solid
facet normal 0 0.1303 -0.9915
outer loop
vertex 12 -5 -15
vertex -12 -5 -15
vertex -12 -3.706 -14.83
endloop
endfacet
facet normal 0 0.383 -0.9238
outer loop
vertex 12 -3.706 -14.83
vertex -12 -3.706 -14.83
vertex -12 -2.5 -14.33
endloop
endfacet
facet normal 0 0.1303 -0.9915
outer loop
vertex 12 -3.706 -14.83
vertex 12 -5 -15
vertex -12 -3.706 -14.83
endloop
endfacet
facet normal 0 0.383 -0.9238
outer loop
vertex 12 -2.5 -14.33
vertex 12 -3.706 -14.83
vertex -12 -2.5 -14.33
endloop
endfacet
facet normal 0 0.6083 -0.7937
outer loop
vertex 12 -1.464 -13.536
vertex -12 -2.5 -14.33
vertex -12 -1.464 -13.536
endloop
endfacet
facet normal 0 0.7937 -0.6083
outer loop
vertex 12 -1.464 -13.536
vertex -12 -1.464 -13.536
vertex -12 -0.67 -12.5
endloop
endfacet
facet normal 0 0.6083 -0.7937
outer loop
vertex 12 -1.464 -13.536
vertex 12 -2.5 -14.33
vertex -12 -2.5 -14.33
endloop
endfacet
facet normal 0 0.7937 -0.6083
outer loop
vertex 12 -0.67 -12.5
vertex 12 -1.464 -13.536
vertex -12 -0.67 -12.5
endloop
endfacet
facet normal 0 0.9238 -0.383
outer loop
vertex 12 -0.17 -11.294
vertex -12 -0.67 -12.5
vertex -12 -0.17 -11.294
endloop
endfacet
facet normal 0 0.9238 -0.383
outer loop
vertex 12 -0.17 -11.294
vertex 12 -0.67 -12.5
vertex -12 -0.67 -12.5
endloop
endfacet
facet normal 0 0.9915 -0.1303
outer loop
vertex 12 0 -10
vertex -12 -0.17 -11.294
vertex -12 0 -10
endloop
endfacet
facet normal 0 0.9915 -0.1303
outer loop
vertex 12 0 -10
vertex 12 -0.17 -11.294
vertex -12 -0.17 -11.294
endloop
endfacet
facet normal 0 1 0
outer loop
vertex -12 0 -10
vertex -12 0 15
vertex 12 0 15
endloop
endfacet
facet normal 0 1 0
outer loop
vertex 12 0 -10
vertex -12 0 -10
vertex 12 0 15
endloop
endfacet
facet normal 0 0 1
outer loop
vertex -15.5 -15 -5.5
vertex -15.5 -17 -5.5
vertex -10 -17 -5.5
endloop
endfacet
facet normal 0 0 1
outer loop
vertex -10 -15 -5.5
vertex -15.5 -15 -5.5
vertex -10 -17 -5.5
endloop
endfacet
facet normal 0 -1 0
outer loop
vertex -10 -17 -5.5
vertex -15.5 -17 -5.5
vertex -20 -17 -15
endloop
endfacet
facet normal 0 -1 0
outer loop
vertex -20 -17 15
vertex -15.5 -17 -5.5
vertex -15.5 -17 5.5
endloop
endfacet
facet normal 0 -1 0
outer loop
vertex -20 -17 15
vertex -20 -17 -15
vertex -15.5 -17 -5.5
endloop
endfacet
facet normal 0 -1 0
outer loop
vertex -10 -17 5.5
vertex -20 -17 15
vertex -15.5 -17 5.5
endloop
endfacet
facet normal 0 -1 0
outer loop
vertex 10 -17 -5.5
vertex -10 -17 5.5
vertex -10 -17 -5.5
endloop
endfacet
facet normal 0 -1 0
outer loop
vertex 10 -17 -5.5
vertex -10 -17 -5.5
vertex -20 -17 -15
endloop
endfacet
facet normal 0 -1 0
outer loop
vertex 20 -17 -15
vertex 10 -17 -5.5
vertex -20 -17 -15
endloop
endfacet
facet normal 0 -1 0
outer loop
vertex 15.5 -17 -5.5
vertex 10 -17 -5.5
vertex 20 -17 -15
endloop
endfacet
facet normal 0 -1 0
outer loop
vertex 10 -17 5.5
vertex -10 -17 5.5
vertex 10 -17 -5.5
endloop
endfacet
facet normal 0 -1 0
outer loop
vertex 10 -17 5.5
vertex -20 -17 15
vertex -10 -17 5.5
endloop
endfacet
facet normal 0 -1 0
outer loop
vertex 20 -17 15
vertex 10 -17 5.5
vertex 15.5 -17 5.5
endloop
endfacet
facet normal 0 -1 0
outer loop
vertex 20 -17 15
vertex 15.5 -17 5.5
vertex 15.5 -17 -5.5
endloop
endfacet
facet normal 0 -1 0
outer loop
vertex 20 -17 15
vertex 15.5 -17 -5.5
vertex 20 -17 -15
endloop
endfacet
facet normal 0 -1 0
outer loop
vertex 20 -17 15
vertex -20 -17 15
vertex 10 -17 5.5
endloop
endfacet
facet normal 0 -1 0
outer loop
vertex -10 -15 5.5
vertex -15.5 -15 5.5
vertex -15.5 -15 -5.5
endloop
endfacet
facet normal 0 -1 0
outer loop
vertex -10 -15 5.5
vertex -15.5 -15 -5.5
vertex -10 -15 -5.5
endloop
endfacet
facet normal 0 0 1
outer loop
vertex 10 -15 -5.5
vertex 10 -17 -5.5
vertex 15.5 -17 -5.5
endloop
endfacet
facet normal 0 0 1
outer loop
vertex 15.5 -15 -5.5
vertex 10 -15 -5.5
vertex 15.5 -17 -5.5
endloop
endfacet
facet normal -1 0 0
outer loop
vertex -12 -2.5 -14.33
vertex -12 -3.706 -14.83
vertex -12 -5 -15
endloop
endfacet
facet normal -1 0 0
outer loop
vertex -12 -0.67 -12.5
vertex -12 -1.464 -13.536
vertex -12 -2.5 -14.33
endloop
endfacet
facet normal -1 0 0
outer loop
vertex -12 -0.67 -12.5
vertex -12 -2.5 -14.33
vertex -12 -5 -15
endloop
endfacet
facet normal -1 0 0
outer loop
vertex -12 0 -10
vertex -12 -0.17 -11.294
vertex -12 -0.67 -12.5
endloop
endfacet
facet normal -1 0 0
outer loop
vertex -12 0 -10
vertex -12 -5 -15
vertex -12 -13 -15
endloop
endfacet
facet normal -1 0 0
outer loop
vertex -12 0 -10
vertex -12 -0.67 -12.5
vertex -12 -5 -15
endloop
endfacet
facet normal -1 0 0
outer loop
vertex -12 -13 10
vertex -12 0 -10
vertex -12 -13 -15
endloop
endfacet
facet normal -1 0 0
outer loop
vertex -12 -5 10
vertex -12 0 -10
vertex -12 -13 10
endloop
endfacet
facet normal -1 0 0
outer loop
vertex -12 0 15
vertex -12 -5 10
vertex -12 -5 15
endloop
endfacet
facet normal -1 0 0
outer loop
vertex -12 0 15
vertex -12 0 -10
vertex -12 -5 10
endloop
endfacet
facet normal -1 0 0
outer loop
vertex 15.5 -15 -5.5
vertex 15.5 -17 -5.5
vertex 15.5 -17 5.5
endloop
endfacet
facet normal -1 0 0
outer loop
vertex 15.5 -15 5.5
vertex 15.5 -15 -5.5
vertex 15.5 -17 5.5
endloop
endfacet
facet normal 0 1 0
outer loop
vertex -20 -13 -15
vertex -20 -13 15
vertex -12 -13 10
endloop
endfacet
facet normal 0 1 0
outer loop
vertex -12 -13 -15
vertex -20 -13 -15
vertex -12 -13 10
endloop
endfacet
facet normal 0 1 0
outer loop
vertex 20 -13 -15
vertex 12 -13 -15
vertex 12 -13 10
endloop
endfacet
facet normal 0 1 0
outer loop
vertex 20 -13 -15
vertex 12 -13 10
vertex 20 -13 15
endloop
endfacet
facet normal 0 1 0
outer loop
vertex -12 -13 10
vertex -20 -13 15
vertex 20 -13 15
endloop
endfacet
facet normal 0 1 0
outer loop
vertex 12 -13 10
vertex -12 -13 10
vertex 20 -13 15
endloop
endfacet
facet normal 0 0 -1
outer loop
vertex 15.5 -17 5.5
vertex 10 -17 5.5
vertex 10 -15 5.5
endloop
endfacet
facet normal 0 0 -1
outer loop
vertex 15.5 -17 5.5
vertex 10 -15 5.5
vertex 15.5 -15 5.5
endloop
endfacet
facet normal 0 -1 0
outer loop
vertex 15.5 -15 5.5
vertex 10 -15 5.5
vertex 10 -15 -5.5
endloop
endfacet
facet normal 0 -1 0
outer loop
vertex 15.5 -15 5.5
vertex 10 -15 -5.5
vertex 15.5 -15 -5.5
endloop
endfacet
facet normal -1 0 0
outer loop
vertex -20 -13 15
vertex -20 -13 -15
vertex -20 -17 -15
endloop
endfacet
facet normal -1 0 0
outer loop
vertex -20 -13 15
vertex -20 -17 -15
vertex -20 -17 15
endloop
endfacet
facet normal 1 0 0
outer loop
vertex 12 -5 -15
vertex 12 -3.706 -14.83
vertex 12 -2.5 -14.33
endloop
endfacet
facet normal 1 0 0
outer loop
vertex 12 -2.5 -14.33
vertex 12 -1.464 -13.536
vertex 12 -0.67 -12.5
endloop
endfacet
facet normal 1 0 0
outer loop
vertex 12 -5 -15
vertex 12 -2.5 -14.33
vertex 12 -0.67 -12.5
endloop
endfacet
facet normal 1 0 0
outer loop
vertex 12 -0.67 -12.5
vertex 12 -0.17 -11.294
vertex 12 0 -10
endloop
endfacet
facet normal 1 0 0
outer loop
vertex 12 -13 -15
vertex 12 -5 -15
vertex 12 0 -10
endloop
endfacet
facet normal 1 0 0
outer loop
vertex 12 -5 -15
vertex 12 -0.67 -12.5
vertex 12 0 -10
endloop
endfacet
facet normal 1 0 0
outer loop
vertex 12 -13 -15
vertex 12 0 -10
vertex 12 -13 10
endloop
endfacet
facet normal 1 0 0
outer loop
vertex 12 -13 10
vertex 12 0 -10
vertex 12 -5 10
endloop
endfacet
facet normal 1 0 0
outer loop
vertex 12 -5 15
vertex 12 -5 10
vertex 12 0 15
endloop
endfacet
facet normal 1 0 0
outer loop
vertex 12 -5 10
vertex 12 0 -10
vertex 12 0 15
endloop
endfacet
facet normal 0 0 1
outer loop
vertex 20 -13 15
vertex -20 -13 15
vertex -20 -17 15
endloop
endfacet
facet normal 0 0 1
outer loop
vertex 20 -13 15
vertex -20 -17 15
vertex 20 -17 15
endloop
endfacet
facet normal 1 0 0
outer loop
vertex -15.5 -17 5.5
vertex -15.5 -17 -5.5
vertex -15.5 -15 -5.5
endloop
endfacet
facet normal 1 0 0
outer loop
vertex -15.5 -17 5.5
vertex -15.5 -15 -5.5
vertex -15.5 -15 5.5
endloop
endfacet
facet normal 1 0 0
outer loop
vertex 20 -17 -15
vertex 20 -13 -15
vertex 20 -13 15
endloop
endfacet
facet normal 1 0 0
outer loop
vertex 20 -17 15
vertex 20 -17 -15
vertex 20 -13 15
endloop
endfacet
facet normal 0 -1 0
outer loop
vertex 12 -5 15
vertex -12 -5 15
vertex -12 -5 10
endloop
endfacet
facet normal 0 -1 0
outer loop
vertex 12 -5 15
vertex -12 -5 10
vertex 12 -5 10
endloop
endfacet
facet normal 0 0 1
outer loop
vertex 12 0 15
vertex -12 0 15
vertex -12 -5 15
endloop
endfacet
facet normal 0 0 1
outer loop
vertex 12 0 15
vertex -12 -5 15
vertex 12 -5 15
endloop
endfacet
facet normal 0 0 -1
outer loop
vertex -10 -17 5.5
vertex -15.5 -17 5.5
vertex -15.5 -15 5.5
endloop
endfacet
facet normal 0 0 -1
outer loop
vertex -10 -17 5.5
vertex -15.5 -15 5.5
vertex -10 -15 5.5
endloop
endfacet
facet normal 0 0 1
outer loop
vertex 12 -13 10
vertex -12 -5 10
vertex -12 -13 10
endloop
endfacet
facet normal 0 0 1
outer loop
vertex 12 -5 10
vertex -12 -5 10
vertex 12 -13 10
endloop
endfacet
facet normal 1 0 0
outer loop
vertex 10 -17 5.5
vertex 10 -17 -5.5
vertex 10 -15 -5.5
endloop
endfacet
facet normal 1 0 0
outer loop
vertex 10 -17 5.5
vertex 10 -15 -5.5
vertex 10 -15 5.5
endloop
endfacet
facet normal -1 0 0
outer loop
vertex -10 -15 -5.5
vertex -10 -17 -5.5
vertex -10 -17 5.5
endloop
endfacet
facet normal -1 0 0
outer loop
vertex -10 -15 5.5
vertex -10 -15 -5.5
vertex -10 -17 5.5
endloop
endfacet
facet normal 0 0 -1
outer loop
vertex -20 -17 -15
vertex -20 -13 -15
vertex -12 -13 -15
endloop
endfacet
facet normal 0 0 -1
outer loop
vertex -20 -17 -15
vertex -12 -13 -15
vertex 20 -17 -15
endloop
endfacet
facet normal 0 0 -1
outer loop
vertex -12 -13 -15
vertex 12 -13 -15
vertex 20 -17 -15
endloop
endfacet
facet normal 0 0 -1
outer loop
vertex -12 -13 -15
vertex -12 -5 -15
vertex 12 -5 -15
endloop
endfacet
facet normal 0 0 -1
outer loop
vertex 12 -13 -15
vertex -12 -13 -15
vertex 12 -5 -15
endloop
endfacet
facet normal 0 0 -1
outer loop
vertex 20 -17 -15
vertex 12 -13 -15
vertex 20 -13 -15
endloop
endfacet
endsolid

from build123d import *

# Parameters (mm, degrees)
F0_W     = 24
F0_H     = 30
F1_DEPTH = 5
F2_W     = 24
F2_H     = 25
F3_DEPTH = 8
F4_R     = 5
F5_W     = 40
F5_H     = 30
F6_DEPTH = 4
F7_W     = 5.5
F7_H     = 11
F8_DEPTH = 2


with BuildPart() as f1:
    # F0 (on Front) → F1 (new body)
    with BuildSketch(Plane.XZ):
        Rectangle(F0_W, F0_H)
    extrude(amount=F1_DEPTH)

    # F2 (on face) → F3 (join)
    with BuildSketch(Plane.XZ.offset(5)):
        with Locations((0, -2.5)):
            Rectangle(F2_W, F2_H)
    extrude(amount=F3_DEPTH)

    # F4
    f4_edges = [f1.edges().sort_by_distance(p)[0] for p in [
        (0, 0, -15),
    ]]
    fillet(f4_edges, radius=F4_R)

    # F5 (on face) → F6 (join)
    with BuildSketch(Plane.XZ.offset(13)):
        Rectangle(F5_W, F5_H)
    extrude(amount=F6_DEPTH)

    # F7 (on face) → F8 (cut)
    with BuildSketch(Plane.XZ.offset(17)):
        with Locations((-12.75, 0)):
            Rectangle(F7_W, F7_H)
        with Locations((12.75, 0)):
            Rectangle(F7_W, F7_H)
    extrude(amount=-F8_DEPTH, mode=Mode.SUBTRACT)


solid = f1.part
